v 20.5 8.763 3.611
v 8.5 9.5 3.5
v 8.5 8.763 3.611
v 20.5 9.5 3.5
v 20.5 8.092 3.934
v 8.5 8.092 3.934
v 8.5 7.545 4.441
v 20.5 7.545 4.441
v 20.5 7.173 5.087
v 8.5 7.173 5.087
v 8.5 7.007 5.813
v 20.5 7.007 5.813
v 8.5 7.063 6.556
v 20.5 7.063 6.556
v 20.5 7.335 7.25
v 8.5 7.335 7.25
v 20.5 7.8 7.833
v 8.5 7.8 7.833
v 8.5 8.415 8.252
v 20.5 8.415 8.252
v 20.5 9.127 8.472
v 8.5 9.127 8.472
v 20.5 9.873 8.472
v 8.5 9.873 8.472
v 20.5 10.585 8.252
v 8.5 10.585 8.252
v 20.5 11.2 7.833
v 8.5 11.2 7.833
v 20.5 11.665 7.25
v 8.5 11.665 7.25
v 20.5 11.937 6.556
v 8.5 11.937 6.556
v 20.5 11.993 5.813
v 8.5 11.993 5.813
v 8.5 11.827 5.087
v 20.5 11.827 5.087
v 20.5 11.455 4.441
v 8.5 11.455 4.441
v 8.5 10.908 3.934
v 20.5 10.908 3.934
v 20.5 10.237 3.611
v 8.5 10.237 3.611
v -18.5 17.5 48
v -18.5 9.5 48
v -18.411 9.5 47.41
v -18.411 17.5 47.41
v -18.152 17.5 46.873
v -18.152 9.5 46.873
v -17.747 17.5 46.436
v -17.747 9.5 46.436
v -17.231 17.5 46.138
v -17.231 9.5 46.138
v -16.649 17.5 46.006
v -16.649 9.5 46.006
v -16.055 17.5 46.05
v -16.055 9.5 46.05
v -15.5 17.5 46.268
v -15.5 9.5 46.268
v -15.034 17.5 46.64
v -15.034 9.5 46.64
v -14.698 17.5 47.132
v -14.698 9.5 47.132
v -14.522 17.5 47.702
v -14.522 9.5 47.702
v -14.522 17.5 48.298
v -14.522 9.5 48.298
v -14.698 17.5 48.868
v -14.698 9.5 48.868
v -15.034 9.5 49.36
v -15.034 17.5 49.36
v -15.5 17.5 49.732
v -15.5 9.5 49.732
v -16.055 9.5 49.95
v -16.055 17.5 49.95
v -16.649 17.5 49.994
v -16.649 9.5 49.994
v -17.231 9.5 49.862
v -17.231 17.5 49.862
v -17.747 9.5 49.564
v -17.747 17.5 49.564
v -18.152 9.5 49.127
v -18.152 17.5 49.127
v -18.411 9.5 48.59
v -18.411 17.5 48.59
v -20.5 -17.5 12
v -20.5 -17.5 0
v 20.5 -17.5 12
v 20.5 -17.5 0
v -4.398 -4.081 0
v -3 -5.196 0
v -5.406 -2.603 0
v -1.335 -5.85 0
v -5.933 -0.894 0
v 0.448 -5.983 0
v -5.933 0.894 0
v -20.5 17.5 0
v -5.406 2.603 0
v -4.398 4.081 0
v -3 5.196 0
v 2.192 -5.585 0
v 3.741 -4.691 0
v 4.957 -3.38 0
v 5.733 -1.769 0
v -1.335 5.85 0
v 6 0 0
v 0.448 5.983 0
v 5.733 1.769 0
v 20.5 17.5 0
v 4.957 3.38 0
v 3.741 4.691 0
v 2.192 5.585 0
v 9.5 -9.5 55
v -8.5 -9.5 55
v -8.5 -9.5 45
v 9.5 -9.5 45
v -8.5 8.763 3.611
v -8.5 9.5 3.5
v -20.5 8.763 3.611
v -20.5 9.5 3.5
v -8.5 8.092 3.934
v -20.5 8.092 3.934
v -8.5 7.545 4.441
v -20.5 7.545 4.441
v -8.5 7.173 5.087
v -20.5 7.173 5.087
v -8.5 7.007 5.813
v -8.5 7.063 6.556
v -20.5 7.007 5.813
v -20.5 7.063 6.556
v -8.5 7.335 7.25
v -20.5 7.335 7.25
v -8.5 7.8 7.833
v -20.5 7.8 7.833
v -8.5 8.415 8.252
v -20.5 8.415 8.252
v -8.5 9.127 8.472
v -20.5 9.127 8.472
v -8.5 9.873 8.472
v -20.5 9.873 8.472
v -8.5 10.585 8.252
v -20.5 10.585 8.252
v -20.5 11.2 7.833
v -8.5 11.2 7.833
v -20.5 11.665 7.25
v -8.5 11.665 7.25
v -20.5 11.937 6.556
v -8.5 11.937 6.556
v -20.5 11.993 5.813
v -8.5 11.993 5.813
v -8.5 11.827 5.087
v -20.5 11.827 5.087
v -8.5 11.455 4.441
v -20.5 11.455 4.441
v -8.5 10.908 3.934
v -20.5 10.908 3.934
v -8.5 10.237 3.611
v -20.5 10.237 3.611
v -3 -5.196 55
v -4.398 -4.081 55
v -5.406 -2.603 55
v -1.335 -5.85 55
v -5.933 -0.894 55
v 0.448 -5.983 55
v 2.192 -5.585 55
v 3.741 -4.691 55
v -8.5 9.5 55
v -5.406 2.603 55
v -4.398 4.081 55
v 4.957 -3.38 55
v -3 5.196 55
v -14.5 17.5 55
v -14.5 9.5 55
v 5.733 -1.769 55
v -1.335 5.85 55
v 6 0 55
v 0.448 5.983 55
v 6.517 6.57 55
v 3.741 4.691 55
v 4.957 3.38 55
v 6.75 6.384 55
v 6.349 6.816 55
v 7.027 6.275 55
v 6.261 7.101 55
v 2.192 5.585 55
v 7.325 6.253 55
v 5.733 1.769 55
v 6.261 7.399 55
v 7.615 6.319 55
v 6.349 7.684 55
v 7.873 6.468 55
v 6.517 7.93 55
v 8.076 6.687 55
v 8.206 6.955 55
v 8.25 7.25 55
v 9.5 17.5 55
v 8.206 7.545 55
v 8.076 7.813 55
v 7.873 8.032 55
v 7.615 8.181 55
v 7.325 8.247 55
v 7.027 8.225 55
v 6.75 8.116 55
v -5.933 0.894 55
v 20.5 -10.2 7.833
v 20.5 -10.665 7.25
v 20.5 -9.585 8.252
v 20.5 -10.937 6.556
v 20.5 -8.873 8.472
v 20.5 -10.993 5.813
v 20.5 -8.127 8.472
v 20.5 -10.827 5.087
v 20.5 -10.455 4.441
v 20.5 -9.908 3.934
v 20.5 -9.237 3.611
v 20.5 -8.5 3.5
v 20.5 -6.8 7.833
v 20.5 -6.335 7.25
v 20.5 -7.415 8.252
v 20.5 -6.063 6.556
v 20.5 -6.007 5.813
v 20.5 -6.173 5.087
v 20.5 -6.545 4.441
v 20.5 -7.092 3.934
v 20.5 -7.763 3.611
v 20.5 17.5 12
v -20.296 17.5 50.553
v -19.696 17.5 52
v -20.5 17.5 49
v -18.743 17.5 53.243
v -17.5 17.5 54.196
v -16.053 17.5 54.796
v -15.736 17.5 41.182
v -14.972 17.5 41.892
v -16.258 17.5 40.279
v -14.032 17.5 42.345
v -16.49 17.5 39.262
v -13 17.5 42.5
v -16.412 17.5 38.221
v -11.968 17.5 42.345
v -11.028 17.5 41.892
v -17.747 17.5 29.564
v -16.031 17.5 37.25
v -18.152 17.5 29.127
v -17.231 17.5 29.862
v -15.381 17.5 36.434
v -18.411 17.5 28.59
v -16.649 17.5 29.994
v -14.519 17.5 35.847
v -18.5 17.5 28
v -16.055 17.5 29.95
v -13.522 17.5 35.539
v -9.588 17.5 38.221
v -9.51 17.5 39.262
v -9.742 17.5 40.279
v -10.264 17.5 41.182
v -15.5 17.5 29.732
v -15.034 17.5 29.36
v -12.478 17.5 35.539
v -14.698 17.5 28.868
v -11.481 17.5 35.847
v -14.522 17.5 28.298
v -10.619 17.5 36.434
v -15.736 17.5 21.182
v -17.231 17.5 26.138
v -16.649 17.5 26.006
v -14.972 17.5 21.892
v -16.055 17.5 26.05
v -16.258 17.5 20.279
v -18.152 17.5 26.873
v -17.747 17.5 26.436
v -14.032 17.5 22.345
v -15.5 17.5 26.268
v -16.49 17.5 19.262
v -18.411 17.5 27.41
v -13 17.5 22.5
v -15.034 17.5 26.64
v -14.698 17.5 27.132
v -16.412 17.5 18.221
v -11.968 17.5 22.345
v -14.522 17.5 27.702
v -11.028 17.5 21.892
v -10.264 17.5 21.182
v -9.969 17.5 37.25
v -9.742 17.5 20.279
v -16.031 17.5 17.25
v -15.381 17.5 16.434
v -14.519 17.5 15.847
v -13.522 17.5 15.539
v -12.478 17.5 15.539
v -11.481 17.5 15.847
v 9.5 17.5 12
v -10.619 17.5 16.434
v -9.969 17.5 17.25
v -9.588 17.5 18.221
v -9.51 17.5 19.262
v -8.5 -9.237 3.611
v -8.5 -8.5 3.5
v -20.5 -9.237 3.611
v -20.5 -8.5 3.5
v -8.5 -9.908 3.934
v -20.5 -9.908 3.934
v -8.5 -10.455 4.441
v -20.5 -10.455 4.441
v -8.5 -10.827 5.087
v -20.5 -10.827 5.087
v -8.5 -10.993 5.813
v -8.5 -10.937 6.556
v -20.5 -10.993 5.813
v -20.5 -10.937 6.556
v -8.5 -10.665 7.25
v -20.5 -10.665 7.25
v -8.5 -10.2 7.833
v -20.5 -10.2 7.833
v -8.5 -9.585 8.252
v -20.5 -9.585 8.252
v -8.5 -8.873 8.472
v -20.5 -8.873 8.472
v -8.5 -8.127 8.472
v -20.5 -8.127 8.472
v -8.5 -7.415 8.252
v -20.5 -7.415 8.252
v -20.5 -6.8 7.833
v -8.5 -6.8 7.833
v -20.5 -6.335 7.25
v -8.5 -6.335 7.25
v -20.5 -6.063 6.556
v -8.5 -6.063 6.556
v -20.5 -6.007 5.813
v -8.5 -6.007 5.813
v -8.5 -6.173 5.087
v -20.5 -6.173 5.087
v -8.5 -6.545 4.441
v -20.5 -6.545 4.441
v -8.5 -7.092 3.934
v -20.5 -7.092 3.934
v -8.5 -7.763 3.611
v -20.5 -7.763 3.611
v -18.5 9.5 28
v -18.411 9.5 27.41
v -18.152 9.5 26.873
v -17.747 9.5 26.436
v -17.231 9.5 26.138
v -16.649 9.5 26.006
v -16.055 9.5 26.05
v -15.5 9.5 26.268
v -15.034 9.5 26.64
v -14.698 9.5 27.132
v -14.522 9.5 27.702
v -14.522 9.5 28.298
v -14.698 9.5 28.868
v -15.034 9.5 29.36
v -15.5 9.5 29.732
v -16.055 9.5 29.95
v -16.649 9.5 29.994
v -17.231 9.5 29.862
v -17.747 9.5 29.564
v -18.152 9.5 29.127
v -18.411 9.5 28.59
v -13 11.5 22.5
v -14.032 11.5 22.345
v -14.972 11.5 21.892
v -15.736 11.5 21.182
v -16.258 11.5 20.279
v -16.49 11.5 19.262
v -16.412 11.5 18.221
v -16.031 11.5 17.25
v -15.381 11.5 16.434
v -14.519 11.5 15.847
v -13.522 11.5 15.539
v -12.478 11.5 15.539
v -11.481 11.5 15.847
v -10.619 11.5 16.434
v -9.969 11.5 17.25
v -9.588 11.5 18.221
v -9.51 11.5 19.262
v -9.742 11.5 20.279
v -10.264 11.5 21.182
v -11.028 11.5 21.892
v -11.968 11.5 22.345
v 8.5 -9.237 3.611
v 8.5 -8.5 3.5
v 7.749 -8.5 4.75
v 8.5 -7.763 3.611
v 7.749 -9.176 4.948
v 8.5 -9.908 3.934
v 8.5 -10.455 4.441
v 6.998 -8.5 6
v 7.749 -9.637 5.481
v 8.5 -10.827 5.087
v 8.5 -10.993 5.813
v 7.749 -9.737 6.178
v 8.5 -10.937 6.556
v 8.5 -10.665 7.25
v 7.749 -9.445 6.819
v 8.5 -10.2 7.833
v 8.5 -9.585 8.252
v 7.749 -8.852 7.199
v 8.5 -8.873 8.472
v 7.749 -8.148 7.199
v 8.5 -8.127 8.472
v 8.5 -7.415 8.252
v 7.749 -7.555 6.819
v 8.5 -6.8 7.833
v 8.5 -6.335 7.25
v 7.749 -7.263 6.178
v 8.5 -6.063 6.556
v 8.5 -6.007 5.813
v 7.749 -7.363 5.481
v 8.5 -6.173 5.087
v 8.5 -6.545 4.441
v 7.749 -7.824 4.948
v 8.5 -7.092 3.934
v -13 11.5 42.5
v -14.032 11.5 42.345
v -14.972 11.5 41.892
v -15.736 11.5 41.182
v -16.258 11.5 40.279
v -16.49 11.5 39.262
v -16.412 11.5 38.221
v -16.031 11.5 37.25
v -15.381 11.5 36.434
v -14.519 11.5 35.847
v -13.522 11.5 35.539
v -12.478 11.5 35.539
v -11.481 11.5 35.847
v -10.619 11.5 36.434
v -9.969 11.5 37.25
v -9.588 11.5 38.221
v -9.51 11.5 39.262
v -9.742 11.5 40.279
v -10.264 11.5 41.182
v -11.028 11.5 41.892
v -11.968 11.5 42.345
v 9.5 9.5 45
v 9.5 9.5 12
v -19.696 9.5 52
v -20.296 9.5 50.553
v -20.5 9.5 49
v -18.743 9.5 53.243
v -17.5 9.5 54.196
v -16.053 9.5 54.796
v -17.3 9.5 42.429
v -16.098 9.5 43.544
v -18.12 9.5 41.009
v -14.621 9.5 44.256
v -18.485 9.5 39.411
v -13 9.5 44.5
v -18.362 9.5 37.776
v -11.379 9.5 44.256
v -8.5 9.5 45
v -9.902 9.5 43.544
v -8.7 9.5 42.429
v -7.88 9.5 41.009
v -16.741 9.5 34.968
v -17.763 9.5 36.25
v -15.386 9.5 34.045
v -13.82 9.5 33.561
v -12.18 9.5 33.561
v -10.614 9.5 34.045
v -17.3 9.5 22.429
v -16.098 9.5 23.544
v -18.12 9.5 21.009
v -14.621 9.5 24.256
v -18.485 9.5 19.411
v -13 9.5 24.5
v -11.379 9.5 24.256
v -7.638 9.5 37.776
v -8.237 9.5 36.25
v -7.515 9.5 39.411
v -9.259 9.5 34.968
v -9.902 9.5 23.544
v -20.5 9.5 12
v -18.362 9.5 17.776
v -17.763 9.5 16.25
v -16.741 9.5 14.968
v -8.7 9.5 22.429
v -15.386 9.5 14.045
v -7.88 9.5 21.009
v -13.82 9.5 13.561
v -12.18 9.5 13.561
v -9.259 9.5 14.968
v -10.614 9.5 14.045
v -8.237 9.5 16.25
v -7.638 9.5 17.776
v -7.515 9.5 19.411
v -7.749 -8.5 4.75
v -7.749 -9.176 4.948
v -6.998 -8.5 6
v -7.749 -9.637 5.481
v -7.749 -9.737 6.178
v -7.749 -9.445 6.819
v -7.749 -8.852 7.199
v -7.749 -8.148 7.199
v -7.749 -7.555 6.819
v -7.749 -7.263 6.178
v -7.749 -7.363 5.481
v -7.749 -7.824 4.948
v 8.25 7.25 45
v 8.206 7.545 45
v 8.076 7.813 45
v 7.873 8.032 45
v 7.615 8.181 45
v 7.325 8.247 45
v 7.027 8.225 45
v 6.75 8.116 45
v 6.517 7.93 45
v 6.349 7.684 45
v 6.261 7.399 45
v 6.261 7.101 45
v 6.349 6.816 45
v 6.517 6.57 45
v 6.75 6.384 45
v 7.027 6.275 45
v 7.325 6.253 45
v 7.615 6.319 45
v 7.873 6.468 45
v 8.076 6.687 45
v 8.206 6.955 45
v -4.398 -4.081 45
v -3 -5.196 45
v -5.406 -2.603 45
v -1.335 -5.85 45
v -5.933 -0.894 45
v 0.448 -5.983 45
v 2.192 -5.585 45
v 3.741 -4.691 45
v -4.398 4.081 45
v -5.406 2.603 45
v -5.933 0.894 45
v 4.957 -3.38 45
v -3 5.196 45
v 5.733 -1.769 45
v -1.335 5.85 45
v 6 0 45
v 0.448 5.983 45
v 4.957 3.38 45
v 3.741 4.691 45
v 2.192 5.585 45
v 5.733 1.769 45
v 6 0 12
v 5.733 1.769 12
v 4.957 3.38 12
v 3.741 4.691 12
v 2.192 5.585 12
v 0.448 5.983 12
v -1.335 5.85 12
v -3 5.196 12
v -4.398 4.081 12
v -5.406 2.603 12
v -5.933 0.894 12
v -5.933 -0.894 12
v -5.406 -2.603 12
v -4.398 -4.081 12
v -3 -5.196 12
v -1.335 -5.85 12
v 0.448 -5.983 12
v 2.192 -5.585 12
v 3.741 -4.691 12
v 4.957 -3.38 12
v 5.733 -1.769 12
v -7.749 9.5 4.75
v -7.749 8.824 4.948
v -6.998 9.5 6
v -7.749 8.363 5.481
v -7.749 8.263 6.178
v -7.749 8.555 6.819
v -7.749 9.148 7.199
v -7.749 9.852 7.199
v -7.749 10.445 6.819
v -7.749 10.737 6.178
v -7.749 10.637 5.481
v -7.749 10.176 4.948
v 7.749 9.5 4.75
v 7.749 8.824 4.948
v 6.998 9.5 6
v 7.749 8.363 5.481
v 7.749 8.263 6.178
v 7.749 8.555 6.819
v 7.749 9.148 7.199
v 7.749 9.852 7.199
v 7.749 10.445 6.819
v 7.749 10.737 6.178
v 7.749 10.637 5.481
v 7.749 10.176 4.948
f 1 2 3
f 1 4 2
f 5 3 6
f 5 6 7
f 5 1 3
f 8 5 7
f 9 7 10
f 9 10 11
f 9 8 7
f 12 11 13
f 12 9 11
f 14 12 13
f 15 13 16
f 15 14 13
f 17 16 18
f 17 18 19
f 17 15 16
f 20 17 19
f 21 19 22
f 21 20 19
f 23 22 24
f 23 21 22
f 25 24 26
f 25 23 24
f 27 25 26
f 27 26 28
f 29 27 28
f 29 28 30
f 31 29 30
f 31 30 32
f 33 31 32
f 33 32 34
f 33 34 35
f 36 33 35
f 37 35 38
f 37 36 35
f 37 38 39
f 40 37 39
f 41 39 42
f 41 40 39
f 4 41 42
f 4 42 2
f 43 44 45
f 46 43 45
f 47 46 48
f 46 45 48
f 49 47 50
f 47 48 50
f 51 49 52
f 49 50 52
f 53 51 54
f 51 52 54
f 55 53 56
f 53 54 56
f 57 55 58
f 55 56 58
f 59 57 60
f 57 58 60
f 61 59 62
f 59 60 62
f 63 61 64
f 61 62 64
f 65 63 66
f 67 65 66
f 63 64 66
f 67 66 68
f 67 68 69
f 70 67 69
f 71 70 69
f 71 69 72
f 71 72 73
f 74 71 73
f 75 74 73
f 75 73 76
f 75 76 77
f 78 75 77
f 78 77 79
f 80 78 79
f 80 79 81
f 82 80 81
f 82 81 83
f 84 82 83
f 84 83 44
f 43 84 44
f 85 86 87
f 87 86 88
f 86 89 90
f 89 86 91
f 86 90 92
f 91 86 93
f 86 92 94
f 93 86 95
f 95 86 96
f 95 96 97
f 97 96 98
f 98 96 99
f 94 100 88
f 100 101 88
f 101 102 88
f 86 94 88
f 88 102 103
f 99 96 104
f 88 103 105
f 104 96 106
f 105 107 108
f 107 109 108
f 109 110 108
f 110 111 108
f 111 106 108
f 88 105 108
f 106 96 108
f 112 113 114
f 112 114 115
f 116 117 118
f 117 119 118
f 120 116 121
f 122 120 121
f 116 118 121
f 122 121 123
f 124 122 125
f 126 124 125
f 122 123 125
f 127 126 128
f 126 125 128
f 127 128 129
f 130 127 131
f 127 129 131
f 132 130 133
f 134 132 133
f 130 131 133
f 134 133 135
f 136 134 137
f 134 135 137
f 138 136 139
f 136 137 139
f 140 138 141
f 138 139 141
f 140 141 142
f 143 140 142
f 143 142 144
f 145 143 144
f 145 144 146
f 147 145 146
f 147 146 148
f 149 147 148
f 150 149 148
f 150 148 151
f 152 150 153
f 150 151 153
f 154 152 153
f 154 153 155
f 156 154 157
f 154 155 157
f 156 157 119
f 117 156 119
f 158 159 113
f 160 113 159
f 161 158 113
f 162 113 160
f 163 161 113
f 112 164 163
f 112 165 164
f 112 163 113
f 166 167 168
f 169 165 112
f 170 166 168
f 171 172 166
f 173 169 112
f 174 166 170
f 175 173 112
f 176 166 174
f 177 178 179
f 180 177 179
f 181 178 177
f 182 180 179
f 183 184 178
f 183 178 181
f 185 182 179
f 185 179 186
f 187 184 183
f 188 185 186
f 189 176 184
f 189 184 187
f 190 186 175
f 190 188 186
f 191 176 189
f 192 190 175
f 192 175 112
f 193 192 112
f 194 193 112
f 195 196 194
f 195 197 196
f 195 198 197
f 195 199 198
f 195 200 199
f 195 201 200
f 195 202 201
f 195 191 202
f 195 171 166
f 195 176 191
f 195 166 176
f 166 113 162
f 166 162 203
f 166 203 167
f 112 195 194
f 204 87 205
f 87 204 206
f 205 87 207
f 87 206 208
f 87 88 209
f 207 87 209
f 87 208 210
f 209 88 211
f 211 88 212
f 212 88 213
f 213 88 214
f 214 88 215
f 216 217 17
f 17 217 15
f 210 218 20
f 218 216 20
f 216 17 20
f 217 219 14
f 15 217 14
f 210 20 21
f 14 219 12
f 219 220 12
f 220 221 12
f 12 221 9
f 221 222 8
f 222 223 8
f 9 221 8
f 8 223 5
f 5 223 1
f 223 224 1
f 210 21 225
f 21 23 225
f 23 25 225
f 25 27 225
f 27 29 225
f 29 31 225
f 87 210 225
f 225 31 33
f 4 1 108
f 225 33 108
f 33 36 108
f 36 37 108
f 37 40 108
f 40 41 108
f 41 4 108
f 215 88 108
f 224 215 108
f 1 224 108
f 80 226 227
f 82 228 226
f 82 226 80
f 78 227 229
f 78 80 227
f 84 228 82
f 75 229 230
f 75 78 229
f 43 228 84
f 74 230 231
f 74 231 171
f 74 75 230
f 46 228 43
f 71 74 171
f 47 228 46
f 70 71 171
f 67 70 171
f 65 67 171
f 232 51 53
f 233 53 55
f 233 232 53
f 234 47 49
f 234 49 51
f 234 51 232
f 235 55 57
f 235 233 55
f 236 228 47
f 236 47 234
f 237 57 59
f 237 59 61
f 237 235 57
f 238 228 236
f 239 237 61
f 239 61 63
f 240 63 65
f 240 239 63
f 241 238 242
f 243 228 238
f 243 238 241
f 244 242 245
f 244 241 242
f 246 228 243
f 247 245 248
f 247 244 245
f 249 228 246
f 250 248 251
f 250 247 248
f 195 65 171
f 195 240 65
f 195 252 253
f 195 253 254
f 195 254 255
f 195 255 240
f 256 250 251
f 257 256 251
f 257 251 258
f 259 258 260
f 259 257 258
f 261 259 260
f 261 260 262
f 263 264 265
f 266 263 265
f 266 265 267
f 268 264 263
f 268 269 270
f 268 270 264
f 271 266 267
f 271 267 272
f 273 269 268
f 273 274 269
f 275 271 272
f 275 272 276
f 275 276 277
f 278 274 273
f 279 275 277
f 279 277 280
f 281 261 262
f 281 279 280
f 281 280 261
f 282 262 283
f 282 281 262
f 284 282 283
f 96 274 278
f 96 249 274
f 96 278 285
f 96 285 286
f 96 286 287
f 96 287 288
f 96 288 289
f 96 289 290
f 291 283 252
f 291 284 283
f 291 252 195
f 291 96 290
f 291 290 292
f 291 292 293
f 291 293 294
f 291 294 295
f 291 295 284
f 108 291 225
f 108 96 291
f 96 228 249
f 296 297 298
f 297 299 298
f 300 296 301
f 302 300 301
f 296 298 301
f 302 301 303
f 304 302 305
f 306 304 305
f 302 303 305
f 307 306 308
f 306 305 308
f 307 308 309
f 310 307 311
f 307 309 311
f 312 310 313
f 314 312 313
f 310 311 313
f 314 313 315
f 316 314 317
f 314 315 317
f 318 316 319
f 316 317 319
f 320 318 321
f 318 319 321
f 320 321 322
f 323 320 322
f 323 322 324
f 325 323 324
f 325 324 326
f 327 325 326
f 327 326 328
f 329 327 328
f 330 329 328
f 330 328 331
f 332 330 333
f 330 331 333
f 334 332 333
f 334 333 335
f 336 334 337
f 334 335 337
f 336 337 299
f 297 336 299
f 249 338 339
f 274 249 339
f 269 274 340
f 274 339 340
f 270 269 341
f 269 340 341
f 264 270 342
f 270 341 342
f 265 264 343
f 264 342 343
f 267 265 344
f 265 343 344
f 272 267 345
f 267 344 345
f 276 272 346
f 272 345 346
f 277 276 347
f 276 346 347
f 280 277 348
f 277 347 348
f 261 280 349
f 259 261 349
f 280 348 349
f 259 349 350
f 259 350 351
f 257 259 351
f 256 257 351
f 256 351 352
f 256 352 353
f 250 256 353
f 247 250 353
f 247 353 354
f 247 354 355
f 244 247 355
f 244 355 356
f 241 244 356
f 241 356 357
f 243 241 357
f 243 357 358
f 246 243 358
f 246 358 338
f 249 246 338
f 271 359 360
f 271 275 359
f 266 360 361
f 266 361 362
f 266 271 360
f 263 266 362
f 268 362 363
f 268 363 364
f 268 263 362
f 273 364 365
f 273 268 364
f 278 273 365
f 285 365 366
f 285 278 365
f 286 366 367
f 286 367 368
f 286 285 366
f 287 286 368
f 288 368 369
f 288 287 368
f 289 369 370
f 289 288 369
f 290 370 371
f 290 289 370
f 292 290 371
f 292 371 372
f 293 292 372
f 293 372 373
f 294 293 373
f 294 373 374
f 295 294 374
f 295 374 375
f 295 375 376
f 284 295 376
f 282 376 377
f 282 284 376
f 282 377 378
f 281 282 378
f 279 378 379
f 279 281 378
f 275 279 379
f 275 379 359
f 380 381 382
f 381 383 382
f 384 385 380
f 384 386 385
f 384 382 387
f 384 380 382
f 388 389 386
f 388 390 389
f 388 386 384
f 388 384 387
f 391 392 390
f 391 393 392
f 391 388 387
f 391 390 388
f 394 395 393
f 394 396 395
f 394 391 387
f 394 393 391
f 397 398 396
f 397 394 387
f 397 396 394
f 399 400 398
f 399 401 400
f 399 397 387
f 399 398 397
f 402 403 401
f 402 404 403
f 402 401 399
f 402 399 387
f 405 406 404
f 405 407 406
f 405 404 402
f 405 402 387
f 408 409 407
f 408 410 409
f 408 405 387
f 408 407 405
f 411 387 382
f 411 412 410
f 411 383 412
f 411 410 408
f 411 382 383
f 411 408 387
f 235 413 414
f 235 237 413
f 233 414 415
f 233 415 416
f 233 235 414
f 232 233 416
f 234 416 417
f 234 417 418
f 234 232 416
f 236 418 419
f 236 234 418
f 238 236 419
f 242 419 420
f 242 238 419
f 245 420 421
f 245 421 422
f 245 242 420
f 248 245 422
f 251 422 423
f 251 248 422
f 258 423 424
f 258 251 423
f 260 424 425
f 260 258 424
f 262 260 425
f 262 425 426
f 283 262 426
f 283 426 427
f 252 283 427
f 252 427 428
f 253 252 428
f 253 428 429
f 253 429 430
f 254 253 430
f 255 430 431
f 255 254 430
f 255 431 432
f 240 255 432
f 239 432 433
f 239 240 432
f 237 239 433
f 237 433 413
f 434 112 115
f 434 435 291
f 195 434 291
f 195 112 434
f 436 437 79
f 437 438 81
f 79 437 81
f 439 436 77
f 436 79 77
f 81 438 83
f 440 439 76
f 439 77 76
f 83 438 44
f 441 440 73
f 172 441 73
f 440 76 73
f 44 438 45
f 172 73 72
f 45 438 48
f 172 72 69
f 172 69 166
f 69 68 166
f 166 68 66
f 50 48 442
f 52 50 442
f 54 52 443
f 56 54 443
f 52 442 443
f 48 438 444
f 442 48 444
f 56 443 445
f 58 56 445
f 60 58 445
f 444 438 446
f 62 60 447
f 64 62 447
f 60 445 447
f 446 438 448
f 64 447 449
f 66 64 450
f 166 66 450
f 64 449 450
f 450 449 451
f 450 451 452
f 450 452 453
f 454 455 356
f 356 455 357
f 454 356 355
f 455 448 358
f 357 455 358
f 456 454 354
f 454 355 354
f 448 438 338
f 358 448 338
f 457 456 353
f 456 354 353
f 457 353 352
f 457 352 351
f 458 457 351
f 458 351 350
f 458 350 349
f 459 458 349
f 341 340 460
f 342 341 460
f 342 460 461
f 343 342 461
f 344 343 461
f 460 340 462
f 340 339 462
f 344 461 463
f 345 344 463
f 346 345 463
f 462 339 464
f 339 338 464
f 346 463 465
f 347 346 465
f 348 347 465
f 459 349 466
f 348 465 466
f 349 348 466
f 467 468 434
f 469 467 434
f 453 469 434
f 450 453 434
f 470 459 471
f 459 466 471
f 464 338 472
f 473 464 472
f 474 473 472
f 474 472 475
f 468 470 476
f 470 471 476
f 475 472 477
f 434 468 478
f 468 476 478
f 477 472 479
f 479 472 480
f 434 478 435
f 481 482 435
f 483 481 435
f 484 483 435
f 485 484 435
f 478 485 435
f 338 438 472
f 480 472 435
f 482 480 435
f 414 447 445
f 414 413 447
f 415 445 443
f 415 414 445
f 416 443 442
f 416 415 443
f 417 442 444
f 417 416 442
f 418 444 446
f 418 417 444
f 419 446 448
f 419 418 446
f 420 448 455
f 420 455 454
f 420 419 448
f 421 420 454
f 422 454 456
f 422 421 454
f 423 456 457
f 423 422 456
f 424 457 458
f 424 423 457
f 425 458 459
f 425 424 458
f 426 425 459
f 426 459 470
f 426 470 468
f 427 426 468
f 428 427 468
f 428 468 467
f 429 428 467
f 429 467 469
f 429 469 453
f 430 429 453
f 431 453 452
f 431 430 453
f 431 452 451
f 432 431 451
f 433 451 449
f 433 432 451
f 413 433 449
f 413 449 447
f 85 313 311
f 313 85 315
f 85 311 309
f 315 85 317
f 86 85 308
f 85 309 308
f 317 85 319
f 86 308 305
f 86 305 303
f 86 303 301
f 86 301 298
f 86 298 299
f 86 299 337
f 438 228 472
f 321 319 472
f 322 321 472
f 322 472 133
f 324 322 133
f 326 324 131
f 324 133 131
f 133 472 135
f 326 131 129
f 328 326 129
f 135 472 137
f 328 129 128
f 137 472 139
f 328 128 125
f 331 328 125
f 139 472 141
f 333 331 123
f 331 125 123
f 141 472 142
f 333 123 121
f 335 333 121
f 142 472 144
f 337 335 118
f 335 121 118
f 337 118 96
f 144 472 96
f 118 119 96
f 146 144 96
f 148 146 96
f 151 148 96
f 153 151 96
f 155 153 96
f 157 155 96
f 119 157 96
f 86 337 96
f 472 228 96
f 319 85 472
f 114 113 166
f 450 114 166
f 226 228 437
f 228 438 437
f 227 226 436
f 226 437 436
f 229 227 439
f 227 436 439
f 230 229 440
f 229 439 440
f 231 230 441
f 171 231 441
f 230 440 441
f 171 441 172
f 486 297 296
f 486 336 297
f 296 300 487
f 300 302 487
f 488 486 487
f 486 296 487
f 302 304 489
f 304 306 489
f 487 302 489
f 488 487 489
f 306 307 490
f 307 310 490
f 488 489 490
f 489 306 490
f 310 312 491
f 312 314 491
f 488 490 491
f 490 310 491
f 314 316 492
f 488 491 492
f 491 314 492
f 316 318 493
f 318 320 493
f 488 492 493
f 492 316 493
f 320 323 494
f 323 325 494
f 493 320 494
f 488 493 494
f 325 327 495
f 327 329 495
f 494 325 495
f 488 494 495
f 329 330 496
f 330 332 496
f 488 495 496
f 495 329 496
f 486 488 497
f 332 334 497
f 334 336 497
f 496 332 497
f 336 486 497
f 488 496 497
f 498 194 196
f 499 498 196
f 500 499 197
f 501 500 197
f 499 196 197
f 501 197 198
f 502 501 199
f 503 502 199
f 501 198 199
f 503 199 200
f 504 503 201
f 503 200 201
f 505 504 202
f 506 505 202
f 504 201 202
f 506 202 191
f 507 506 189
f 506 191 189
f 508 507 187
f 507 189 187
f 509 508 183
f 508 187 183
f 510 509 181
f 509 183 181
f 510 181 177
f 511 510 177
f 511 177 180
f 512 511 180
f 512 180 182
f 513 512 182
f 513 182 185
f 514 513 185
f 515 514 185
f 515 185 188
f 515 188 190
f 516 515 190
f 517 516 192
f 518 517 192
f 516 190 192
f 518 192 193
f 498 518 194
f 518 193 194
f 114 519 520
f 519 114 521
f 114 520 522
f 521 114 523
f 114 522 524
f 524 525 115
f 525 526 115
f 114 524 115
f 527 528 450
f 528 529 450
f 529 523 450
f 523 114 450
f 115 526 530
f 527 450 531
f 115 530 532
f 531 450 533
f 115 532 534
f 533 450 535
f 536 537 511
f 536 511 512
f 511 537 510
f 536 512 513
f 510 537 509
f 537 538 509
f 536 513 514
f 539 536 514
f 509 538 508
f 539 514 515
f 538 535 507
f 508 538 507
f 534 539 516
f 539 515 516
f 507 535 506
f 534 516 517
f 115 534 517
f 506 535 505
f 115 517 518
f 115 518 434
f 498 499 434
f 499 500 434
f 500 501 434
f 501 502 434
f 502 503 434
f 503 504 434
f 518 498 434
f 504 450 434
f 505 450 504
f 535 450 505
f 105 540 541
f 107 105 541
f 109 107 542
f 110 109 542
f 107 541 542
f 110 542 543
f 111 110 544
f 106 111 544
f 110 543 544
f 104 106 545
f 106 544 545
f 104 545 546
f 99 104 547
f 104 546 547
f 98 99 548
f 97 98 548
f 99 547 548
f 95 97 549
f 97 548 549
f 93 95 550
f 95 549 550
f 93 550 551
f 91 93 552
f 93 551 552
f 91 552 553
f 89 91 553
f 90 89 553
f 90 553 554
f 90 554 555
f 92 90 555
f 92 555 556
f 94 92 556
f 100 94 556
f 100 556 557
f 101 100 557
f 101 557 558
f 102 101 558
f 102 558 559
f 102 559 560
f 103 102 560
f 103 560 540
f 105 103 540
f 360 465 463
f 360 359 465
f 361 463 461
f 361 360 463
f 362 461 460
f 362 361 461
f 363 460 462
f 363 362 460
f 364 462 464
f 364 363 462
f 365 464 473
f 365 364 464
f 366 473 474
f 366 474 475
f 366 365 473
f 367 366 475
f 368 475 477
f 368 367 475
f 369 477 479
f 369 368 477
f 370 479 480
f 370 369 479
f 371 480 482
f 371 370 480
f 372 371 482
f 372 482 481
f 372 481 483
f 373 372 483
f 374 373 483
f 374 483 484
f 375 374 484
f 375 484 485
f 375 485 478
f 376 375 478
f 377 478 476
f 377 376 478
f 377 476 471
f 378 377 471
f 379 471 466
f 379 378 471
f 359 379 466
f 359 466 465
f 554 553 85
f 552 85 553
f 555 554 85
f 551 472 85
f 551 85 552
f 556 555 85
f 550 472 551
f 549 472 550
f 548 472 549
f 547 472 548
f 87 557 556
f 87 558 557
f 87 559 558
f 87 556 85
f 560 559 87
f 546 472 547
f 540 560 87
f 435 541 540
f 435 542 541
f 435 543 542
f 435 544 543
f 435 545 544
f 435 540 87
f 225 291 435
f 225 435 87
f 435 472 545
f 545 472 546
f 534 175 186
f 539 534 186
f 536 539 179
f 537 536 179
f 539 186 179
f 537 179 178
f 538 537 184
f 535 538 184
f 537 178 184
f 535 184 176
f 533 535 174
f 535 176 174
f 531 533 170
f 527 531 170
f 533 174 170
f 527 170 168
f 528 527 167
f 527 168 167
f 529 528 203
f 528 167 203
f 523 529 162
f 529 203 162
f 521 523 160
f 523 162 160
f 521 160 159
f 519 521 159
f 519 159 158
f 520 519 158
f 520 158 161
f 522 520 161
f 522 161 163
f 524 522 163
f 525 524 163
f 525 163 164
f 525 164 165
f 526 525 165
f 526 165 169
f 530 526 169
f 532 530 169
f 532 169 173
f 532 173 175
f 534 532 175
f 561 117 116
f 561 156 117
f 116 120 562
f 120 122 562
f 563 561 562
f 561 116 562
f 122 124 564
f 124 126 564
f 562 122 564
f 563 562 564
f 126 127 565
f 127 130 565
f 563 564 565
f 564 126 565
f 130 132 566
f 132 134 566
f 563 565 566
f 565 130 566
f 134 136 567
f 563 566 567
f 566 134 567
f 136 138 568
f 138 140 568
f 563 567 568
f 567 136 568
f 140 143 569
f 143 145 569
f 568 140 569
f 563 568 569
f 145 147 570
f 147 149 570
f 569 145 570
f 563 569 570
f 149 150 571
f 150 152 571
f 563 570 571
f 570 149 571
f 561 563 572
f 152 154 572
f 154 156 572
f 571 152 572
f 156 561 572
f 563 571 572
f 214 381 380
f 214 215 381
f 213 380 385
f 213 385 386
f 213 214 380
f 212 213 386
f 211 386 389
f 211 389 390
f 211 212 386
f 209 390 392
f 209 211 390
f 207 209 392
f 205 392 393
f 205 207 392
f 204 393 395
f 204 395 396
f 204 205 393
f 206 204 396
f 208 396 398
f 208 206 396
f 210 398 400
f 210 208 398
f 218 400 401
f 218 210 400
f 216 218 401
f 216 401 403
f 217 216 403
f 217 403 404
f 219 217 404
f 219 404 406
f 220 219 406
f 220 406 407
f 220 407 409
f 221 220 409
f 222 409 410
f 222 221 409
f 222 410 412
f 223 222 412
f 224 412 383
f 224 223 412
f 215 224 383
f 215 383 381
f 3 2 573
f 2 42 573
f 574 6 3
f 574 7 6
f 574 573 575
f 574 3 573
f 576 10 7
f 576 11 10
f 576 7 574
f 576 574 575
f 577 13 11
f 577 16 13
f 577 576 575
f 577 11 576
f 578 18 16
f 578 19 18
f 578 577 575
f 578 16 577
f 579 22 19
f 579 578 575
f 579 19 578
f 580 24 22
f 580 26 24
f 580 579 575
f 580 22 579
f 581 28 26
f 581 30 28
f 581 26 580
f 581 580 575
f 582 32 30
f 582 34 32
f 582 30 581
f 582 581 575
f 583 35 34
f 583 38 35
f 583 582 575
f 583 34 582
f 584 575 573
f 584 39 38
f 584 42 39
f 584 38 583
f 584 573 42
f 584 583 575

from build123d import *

# Parameters (mm, degrees)
SKETCH_1_W                     = 41
SKETCH_1_H                     = 35
EXTRUDE_1_DEPTH                = 12
SKETCH_2_W                     = 30
SKETCH_2_H                     = 55
EXTRUDE_2_DEPTH                = 8
SKETCH_3_W                     = 18
SKETCH_3_H                     = 19
EXTRUDE_3_DEPTH                = 10
FILLET_1_R                     = 6
F_4_0MM_1_D                    = 4
HOLE_WIZARD_7_0_7_1_AT_2_COUNT = 2
HOLE_WIZARD_7_0_7_1_AT_2_PITCH = 20
SKETCH_9_R                     = 1
CUT_EXTRUDE_1_DEPTH            = 10
HOLE_WIZARD_M6_1_AT_2_COUNT    = 2
HOLE_WIZARD_M6_1_AT_2_PITCH    = 18
SKETCH_12_R                    = 6
CUT_EXTRUDE_2_DEPTH            = 62.249489794


with BuildPart() as part:
    # 草图1 → 凸台-拉伸1 (new body)
    with BuildSketch(Plane.XY):
        Rectangle(SKETCH_1_W, SKETCH_1_H)
    extrude(amount=EXTRUDE_1_DEPTH)

    # 草图2 → 凸台-拉伸2 (add)
    with BuildSketch(Plane(origin=(0, 17.5, 0), x_dir=(1, 0, 0), z_dir=(0, 1, 0))):
        with Locations((-5.5, -27.5)):
            Rectangle(SKETCH_2_W, SKETCH_2_H)
    extrude(amount=-EXTRUDE_2_DEPTH)

    # 草图3 → 凸台-拉伸3 (add)
    with BuildSketch(Plane.XY.offset(55)):
        with Locations((0.5, 0)):
            Rectangle(SKETCH_3_W, SKETCH_3_H)
    extrude(amount=-EXTRUDE_3_DEPTH)

    # 圆角1
    fillet_1_edges = [part.edges().sort_by_distance(p)[0] for p in [
        (-20.5, 13.5, 55),
    ]]
    fillet(fillet_1_edges, radius=FILLET_1_R)

    # Ø4.0mm 暗销孔1 (through all)
    with Locations(Plane(origin=(0, 17.5, 0), x_dir=(1, 0, 0), z_dir=(0, 1, 0))):
        with Locations((-16.5, -48), (-16.5, -28)):
            Hole(F_4_0MM_1_D / 2)

    # 草图8 → Ø7.0 (7) 直径孔1 (revolve, cut)
    with BuildSketch(Plane(origin=(-13, 17.5, 39), x_dir=(0, 0, 1), z_dir=(1, 0, 0))):
        Polygon((0, 0), (0, 8), (5.5, 8), (3.5, 6), (3.5, 0), align=None)
    hole_wizard_7_0_7_1 = revolve(axis=Axis((-13, 23.85, 39), (0, -1, 0)), mode=Mode.SUBTRACT)

    # Ø7.0 (7) 直径孔1 at 2: Ø7.0 (7) 直径孔1 ×2
    with Locations(*[(0, 0, -i * HOLE_WIZARD_7_0_7_1_AT_2_PITCH) for i in range(1, HOLE_WIZARD_7_0_7_1_AT_2_COUNT)]):
        add(hole_wizard_7_0_7_1, mode=Mode.SUBTRACT)

    # 草图9 → 切除-拉伸1 (cut)
    with BuildSketch(Plane.XY.offset(55)):
        with Locations((7.25, 7.25)):
            Circle(SKETCH_9_R)
    extrude(amount=-CUT_EXTRUDE_1_DEPTH, mode=Mode.SUBTRACT)

    # 草图11 → M6 螺纹孔1 (revolve, cut)
    with BuildSketch(Plane(origin=(20.5, 9.5, 6), x_dir=(0, 0, -1), z_dir=(0, 1, 0))):
        Polygon((0, 0), (0, 13.502151548), (2.5, 12), (2.5, 0), align=None)
    hole_wizard_m6_1 = revolve(axis=Axis((26.85, 9.5, 6), (-1, 0, 0)), mode=Mode.SUBTRACT)

    # M6 螺纹孔1 at 2: M6 螺纹孔1 ×2
    with Locations(*[(0, -i * HOLE_WIZARD_M6_1_AT_2_PITCH, 0) for i in range(1, HOLE_WIZARD_M6_1_AT_2_COUNT)]):
        add(hole_wizard_m6_1, mode=Mode.SUBTRACT)

    # 镜向1: M6 螺纹孔1 across plane
    add(hole_wizard_m6_1.mirror(Plane(origin=(0, 0, 0), x_dir=(0, 0, 1), z_dir=(1, 0, 0))), mode=Mode.SUBTRACT)

    # 镜向1 copy 1 sketch → 镜向1 copy 1 (revolve, cut)
    with BuildSketch(Plane(origin=(-20.5, -8.5, 6), x_dir=(0, 0, -1), z_dir=(0, 1, 0))):
        Polygon((0, 0), (0, -13.502151548), (2.5, -12), (2.5, 0), align=None)
    revolve(axis=Axis((-26.85, -8.5, 6), (-1, 0, 0)), mode=Mode.SUBTRACT)

    # 草图12 → 切除-拉伸2 (cut, through all)
    with BuildSketch(Plane.XY.offset(55)):
        Circle(SKETCH_12_R)
    extrude(amount=-CUT_EXTRUDE_2_DEPTH, mode=Mode.SUBTRACT)


solid = part.part
